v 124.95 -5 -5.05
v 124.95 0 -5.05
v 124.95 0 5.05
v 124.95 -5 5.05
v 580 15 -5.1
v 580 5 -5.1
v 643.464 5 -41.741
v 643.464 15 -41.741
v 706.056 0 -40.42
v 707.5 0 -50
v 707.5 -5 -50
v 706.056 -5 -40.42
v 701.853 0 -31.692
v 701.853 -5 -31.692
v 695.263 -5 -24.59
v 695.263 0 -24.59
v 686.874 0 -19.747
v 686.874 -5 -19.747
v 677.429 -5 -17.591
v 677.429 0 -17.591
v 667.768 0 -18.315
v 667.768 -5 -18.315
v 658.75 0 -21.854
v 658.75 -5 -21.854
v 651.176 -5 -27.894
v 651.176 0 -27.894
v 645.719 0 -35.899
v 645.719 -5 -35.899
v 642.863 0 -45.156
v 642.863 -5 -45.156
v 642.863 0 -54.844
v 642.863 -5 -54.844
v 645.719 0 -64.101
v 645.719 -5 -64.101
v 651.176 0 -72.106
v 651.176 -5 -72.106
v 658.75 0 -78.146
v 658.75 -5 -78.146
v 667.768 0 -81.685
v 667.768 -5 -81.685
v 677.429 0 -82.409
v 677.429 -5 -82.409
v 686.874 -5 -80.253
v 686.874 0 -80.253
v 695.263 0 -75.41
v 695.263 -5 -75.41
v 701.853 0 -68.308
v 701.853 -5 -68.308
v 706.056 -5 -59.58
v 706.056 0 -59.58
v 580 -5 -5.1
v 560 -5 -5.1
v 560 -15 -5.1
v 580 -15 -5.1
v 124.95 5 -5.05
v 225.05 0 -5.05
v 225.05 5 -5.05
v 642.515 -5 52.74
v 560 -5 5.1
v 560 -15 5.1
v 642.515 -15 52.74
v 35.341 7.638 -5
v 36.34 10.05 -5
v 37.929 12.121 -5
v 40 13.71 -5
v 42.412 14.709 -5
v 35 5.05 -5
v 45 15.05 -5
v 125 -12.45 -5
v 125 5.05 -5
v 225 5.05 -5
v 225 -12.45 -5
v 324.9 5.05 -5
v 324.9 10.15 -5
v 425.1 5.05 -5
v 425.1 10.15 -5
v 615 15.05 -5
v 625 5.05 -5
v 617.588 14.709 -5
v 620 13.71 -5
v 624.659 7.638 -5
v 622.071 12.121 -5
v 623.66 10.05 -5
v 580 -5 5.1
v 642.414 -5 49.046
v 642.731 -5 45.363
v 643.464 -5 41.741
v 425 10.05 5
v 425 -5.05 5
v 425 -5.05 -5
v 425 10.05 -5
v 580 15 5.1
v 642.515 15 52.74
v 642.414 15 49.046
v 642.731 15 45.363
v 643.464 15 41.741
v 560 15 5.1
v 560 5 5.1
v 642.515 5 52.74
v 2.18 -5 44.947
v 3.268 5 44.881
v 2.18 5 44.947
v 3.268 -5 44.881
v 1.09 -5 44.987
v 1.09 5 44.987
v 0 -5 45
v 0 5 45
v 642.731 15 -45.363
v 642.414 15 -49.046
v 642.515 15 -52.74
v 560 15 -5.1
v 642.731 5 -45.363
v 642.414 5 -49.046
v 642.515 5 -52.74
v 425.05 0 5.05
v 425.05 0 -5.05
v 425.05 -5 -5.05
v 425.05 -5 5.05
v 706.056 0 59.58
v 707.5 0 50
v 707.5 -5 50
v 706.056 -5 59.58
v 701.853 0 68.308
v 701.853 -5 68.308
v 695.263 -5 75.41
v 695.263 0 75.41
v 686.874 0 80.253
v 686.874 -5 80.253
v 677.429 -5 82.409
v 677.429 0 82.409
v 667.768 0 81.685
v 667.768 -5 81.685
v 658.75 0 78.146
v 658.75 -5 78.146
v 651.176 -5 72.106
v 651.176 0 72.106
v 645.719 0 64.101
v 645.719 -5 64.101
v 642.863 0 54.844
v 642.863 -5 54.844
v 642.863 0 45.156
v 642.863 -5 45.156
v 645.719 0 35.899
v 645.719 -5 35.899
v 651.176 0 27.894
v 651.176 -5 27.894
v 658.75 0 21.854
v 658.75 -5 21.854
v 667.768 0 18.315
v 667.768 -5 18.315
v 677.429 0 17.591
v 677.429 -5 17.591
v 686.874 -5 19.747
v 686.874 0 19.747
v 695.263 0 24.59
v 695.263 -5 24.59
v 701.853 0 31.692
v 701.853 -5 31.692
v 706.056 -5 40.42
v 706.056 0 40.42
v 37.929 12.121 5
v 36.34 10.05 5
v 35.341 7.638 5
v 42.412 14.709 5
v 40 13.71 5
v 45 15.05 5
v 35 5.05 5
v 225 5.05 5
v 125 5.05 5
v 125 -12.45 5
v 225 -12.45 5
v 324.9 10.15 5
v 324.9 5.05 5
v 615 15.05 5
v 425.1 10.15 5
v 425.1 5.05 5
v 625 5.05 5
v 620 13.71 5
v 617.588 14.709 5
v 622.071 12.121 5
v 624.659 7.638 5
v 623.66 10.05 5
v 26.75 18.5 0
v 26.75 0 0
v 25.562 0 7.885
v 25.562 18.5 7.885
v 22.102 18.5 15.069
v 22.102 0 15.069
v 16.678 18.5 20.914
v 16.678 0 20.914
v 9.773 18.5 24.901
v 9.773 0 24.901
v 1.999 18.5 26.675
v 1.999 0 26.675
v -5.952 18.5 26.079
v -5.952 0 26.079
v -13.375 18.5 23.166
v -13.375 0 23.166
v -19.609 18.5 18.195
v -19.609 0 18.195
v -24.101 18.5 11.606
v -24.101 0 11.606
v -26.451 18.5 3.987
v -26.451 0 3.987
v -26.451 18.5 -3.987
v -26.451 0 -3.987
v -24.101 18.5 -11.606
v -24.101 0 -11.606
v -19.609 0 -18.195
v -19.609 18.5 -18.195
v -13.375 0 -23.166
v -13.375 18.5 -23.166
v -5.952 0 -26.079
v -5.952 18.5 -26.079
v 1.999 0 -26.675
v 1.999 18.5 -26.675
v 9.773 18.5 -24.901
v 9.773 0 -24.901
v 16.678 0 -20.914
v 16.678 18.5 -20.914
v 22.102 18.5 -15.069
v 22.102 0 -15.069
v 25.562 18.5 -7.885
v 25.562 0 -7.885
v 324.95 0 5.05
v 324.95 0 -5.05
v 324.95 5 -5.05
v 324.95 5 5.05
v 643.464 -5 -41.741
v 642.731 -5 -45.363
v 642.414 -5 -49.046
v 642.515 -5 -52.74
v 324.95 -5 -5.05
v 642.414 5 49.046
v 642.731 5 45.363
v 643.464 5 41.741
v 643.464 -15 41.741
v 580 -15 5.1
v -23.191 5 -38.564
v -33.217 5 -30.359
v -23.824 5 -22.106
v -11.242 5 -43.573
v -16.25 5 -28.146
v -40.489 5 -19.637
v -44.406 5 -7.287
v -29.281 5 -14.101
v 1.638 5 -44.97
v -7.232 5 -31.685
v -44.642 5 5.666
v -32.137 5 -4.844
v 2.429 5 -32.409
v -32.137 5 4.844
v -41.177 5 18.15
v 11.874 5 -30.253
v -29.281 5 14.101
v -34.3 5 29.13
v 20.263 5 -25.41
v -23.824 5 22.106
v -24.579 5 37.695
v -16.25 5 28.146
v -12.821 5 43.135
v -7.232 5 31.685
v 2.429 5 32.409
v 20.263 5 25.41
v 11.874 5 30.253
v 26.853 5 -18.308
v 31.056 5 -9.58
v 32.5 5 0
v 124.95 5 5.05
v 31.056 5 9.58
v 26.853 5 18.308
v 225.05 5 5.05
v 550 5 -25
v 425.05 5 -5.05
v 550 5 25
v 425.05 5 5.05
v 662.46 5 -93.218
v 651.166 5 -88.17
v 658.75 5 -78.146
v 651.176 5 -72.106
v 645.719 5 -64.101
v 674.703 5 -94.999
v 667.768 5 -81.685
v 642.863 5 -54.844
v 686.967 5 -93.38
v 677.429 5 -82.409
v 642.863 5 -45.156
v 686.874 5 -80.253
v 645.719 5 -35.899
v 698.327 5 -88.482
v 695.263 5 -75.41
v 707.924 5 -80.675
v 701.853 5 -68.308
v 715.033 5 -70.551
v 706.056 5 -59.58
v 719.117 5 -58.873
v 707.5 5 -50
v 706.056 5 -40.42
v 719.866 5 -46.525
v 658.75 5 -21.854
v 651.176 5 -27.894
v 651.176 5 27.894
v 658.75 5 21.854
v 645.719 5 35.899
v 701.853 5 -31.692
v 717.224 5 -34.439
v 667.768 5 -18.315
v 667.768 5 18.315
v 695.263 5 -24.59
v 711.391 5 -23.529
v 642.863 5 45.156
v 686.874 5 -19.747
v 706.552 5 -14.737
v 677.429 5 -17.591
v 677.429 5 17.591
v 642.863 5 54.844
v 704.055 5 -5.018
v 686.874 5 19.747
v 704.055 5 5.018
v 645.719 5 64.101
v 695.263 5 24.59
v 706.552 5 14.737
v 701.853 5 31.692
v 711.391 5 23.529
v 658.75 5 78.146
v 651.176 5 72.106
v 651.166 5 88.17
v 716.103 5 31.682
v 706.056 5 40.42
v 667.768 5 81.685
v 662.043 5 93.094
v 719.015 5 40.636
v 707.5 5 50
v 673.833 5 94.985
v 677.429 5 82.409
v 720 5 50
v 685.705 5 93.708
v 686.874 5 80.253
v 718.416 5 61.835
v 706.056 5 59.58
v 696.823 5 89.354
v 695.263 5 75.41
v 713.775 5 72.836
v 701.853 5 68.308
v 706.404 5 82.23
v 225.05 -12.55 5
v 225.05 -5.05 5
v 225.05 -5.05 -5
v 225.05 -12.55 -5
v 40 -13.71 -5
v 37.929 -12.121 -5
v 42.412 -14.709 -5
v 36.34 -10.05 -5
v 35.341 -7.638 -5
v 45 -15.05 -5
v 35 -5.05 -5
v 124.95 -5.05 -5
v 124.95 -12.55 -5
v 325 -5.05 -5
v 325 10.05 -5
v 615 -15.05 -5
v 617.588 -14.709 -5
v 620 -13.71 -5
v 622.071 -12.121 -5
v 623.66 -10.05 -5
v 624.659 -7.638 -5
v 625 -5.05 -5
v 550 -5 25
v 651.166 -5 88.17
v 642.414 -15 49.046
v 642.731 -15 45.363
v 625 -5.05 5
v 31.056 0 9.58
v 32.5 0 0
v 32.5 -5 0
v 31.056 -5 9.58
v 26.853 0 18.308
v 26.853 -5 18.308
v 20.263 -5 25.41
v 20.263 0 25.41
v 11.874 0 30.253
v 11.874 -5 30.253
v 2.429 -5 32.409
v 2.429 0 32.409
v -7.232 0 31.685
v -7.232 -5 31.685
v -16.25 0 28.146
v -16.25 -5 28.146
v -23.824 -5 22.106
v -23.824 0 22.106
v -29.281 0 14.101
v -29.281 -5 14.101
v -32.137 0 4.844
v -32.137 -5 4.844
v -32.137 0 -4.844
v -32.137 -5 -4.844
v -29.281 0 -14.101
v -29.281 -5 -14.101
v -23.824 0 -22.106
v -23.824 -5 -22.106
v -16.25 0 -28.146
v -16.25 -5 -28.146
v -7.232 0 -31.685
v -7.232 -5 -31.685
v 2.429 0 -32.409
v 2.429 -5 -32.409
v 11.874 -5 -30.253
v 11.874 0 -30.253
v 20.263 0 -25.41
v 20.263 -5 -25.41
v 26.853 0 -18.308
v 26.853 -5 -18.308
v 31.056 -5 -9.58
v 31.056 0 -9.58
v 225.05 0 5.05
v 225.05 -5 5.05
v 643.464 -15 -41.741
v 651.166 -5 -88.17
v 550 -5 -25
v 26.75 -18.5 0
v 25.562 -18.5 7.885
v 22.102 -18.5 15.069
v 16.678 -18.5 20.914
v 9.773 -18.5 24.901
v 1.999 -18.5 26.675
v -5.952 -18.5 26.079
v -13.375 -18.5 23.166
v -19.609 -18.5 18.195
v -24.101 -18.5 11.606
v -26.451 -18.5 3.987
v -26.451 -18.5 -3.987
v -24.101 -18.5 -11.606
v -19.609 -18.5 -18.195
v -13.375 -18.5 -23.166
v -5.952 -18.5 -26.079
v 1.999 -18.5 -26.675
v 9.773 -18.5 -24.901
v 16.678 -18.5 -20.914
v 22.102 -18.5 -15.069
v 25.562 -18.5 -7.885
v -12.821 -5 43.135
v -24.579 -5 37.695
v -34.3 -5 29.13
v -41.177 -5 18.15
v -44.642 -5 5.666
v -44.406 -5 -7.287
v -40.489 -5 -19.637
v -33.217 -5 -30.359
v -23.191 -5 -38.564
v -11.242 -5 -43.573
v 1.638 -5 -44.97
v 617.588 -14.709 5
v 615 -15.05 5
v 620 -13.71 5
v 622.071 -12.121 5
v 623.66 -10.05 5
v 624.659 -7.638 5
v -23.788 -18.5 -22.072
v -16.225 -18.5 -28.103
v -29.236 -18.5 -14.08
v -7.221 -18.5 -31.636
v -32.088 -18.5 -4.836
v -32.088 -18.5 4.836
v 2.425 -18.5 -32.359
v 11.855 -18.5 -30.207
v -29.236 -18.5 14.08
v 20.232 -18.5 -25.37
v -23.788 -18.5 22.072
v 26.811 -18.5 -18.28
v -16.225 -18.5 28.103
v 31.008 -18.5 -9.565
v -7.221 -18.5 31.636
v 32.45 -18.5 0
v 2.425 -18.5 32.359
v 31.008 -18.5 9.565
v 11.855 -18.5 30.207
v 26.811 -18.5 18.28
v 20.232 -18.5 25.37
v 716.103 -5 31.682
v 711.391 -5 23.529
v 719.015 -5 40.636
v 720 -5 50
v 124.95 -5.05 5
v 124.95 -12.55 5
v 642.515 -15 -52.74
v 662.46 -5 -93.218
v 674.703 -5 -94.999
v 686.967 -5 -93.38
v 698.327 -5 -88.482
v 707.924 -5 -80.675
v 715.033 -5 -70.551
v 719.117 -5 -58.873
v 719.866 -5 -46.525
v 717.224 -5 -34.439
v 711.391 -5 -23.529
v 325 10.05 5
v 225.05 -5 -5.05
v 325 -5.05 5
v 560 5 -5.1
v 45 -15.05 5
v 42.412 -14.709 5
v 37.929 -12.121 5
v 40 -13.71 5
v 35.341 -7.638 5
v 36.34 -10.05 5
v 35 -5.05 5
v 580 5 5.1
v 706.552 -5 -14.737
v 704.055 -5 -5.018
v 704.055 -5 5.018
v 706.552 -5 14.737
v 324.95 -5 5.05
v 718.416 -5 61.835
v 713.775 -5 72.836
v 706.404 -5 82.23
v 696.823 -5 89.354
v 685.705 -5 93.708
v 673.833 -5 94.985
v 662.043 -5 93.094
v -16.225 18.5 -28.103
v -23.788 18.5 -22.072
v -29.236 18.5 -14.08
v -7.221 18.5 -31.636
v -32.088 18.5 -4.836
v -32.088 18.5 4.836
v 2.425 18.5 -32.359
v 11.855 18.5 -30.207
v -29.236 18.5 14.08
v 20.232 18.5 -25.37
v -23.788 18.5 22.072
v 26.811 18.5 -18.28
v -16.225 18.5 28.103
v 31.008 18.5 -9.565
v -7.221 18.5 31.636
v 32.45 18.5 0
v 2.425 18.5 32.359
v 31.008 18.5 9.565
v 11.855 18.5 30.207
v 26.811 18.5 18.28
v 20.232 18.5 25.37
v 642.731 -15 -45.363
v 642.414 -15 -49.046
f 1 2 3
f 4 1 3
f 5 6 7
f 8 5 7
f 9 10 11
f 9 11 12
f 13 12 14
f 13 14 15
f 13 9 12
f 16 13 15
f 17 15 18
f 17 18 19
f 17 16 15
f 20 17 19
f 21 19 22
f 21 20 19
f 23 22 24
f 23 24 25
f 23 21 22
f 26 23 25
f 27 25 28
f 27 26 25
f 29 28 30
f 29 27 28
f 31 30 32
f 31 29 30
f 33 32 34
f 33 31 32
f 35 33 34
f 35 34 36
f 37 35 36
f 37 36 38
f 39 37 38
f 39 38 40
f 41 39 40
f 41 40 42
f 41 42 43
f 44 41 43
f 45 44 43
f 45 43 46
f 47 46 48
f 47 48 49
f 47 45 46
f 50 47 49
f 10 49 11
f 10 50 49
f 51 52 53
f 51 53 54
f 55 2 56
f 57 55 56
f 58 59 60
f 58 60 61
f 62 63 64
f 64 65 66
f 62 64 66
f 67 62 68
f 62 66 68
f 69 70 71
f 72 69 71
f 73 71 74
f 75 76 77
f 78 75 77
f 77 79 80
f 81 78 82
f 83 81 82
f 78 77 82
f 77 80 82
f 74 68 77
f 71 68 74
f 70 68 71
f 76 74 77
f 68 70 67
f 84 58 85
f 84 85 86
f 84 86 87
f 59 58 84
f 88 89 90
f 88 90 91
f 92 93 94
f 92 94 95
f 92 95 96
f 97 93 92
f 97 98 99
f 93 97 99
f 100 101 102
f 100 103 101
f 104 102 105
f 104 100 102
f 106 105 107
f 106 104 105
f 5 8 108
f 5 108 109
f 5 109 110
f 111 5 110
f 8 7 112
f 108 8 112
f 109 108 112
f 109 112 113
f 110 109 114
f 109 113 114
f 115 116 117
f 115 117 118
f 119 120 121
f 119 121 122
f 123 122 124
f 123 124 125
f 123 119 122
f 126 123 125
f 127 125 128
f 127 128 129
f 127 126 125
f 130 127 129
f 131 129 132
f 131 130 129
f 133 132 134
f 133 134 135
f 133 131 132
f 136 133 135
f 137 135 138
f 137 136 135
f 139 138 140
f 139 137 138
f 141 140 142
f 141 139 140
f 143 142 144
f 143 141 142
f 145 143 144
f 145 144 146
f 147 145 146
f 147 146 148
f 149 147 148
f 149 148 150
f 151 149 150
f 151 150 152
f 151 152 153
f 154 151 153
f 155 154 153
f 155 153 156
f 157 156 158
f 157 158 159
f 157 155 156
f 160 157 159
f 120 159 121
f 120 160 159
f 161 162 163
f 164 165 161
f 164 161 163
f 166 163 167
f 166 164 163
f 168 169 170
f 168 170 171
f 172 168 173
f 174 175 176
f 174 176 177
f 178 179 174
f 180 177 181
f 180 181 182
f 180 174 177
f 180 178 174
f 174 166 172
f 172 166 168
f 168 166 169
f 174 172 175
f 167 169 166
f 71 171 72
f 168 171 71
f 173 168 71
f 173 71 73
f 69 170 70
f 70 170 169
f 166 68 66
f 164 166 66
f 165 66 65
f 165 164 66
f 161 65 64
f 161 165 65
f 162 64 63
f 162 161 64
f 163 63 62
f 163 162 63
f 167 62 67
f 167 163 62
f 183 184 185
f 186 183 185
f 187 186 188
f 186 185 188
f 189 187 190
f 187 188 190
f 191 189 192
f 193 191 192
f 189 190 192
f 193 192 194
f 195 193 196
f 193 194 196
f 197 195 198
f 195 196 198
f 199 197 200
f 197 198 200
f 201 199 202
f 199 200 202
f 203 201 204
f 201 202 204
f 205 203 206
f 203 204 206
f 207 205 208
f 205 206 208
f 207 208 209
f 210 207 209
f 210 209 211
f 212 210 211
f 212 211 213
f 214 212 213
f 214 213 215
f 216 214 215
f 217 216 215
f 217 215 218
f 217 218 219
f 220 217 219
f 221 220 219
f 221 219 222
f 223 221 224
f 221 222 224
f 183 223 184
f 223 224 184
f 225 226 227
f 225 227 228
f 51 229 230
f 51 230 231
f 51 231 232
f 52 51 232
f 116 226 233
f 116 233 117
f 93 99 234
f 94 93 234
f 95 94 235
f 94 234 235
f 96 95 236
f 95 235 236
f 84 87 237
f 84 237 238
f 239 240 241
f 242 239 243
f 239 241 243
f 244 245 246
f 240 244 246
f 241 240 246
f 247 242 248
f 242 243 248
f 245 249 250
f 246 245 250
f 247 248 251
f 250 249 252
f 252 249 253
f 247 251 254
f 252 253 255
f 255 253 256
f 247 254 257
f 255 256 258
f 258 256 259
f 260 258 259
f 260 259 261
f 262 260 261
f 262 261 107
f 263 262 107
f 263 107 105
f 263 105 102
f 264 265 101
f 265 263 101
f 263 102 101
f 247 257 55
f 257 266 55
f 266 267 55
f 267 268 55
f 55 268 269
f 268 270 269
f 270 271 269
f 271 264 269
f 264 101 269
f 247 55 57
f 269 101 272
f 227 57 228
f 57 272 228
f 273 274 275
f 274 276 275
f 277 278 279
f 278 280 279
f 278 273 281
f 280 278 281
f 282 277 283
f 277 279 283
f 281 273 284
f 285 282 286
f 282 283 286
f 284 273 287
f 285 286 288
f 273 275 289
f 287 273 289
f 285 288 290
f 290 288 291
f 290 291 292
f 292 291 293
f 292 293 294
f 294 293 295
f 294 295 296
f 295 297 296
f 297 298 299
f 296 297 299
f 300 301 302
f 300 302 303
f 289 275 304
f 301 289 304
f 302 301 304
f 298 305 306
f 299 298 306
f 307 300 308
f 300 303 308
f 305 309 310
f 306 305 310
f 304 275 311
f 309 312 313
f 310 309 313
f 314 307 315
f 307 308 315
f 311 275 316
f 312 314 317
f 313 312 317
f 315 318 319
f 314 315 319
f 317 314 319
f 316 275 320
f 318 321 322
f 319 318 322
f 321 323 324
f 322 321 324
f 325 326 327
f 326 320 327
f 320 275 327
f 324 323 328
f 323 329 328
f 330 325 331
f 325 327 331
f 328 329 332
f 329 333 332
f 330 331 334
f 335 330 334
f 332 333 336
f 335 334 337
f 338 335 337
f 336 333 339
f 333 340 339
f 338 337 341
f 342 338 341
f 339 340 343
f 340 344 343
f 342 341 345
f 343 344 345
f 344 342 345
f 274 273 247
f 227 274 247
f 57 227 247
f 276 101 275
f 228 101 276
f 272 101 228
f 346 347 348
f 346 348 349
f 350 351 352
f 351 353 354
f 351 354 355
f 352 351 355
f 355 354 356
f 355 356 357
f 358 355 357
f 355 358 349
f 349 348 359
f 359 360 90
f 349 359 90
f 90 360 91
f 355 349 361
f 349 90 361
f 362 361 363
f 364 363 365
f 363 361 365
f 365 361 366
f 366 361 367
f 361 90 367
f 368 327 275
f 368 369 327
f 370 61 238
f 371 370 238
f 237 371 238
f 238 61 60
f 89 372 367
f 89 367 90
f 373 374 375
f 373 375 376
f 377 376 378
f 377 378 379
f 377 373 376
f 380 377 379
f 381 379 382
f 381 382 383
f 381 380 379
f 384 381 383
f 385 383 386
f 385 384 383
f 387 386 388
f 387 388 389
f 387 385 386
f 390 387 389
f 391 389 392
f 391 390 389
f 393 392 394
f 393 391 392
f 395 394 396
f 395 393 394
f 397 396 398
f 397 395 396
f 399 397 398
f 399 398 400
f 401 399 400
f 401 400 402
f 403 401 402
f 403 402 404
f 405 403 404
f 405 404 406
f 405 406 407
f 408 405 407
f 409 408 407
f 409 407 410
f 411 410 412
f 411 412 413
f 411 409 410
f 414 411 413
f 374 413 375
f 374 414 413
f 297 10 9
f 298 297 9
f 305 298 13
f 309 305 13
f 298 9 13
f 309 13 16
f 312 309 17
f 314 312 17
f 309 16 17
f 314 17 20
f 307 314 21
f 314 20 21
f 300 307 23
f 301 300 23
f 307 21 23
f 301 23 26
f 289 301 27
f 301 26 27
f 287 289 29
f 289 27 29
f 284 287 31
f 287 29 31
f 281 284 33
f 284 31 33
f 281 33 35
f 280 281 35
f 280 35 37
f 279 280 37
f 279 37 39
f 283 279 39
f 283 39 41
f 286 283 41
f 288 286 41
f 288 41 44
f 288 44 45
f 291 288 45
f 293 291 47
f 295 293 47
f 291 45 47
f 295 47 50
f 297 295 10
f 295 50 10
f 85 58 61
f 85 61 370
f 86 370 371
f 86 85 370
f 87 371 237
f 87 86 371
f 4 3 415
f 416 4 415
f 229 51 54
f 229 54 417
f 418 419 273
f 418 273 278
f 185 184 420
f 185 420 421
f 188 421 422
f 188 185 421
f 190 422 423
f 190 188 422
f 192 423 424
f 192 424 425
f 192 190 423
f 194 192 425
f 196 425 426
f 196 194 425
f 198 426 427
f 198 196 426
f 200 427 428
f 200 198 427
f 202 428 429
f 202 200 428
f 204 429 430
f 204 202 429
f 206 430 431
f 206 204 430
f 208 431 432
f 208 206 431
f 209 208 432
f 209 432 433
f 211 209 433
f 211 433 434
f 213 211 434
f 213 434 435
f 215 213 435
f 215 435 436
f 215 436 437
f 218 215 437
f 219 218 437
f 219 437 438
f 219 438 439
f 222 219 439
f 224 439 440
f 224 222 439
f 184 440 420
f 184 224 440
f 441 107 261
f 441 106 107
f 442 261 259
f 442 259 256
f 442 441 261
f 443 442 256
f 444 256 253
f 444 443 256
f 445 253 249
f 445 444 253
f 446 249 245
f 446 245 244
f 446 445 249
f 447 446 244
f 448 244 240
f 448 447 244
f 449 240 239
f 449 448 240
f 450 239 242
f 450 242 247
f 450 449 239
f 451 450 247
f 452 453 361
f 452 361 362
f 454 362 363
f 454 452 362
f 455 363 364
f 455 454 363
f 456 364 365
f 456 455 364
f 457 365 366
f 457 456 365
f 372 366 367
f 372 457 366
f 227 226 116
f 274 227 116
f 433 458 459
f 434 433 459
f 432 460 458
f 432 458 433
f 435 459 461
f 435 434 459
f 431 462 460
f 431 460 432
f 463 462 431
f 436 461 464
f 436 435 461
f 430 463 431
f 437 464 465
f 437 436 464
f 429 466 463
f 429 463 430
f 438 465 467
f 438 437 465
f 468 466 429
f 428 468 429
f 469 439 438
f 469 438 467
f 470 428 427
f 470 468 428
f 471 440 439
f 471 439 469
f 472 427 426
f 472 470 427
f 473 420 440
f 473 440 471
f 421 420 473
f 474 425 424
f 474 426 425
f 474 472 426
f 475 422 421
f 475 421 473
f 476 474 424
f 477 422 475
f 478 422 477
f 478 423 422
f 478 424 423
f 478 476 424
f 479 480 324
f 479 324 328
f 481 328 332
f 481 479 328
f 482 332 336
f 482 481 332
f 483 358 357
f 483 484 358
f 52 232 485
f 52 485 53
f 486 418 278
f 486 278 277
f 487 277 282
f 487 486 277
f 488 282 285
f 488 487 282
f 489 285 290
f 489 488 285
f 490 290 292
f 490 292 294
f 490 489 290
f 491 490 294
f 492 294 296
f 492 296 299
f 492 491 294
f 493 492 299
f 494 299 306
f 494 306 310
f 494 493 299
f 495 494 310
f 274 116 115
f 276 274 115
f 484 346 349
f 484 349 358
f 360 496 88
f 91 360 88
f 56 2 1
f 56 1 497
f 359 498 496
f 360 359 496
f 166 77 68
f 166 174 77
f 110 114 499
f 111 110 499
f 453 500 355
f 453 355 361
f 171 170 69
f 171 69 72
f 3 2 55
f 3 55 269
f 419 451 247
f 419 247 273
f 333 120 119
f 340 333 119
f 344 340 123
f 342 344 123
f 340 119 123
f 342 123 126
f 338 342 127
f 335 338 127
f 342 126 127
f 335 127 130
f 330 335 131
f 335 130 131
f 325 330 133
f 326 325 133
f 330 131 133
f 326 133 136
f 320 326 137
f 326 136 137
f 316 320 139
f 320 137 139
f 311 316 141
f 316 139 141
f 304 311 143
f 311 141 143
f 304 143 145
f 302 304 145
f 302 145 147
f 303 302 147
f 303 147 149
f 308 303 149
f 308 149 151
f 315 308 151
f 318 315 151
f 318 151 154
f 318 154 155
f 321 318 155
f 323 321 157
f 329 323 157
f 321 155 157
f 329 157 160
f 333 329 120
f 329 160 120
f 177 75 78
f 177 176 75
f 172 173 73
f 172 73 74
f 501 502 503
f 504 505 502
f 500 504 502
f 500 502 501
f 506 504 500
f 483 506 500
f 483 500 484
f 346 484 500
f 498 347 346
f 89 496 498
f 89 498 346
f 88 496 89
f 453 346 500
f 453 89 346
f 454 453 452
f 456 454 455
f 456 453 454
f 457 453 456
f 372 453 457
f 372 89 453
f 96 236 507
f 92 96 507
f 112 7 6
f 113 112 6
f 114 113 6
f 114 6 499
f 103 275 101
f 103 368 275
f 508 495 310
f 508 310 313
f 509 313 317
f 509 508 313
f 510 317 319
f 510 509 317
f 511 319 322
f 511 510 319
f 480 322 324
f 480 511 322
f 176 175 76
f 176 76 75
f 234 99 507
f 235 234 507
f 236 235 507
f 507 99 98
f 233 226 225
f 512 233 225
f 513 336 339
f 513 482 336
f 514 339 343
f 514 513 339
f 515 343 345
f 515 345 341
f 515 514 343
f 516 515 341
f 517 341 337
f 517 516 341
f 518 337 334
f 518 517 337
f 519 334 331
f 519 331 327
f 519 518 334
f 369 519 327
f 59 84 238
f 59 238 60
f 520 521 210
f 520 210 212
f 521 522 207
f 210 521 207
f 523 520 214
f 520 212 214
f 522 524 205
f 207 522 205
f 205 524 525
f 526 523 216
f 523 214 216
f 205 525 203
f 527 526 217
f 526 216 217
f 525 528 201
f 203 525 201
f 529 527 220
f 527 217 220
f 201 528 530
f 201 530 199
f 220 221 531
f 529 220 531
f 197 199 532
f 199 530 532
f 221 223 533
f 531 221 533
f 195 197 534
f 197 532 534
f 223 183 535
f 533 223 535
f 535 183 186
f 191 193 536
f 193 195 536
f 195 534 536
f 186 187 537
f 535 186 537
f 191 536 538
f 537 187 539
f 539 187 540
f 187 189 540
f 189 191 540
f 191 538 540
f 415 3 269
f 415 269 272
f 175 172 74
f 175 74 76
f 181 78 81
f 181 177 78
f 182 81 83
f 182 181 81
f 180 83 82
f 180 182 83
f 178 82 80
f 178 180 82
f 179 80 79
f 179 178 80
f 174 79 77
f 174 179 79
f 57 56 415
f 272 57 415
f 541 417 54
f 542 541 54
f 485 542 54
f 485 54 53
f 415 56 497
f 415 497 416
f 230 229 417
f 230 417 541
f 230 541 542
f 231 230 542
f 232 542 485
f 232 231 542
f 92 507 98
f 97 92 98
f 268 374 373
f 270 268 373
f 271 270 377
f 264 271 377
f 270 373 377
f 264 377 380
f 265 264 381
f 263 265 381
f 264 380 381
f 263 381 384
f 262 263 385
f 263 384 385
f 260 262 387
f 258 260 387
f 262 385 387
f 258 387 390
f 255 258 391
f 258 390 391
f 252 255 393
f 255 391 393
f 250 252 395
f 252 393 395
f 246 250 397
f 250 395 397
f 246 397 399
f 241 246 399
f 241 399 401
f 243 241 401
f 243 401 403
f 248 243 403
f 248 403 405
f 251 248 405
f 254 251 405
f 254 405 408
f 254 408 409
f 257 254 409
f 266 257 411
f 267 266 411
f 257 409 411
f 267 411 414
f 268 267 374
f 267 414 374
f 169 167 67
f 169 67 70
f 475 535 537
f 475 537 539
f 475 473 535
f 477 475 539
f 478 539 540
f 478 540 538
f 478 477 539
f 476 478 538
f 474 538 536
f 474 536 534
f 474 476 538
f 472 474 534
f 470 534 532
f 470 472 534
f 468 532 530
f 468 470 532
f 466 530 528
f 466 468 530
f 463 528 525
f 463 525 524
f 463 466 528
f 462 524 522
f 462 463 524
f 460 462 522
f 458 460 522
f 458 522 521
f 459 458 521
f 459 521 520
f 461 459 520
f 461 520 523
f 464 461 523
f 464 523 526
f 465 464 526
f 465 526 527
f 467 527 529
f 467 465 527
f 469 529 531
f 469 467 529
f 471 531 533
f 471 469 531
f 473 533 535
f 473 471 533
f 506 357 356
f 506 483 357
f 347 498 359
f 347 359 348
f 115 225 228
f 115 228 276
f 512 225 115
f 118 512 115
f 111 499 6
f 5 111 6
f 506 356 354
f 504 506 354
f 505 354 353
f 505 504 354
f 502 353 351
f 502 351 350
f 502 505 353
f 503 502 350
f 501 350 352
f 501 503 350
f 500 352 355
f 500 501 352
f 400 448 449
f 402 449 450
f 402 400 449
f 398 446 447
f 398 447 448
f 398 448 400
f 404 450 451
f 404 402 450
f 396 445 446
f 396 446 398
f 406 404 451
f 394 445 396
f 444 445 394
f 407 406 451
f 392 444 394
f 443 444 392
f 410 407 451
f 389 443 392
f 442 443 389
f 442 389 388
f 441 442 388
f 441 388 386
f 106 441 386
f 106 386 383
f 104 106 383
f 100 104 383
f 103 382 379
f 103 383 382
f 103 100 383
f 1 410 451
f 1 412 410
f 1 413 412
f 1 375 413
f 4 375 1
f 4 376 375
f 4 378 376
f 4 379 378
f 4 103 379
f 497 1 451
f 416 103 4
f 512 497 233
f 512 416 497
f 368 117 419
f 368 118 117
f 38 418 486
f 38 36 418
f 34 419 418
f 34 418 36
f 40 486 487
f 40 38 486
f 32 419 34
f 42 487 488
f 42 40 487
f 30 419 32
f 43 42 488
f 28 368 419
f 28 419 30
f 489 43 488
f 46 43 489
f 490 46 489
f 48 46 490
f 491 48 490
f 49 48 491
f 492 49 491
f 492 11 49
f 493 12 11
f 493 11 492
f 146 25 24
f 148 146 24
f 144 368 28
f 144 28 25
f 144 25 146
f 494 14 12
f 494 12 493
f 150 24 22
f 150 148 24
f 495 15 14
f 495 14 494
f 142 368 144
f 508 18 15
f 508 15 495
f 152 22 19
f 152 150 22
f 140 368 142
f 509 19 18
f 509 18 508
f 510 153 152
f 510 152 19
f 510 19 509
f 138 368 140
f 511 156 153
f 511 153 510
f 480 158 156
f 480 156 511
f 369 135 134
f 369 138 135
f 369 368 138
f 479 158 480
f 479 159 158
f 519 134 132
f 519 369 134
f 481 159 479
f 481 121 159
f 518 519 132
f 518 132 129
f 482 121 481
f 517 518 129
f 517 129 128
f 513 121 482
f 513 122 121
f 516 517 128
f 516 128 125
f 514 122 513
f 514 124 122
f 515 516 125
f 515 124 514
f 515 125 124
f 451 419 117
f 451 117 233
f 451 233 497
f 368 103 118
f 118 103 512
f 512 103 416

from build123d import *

# Parameters (mm, degrees)
F0_R          = 32.5
F0_W          = 100.1
F0_H          = 10.1
F1_DEPTH      = 5
F1_DEPTH_BACK = 5
F2_W          = 100
F2_H          = 17.5
F2_H_2        = 15.1
F3_DEPTH      = 5
F3_DEPTH_BACK = 5
F5_DEPTH      = 10
F7_R          = 32.45
F7_R_2        = 26.75
F8_DEPTH      = 18.5
F8_DEPTH_BACK = 18.5


with BuildPart() as f1:
    # F0 (on Front) → F1 (new body, two sides)
    with BuildSketch(Plane.XZ) as f1_sk:
        with BuildLine():
            ThreePointArc((1.637721, -44.970189), (32.393652, -31.235417), (45, 0))
            ThreePointArc((45, 0), (32.955108, 30.642469), (3.268405, 44.881149))
            Line((3.268405, 44.881149), (0, 45))
            ThreePointArc((0, 45), (-44.992547, -0.818996), (1.637721, -44.970189))
        make_face()
        Circle(F0_R, mode=Mode.SUBTRACT)
        with BuildLine():
            ThreePointArc((3.268405, 44.881149), (32.955108, 30.642469), (45, 0))
            ThreePointArc((45, 0), (32.393652, -31.235417), (1.637721, -44.970189))
            Line((1.637721, -44.970189), (550, -25))
            Line((550, -25), (651.16602, -88.169902))
            ThreePointArc((651.16602, -88.169902), (707.924431, -80.675427), (711.391042, -23.529412))
            ThreePointArc((711.391042, -23.529412), (703.738635, 0), (711.391042, 23.529412))
            ThreePointArc((711.391042, 23.529412), (642.075569, 19.324573), (651.16602, 88.169902))
            Line((651.16602, 88.169902), (550, 25))
            Line((550, 25), (3.268405, 44.881149))
        make_face()
        with Locations((175, 0)):
            Rectangle(F0_W, F0_H, mode=Mode.SUBTRACT)
        with Locations((675, -50)):
            Circle(F0_R, mode=Mode.SUBTRACT)
        with Locations((375, 0)):
            Rectangle(F0_W, F0_H, mode=Mode.SUBTRACT)
        with BuildLine():
            Line((0, 45), (3.268405, 44.881149))
            ThreePointArc((3.268405, 44.881149), (1.635283, 44.970277), (0, 45))
        make_face()
        with BuildLine():
            ThreePointArc((720, 50), (696.822819, 89.354346), (651.16602, 88.169902))
            ThreePointArc((651.16602, 88.169902), (642.075569, 19.324573), (711.391042, 23.529412))
            ThreePointArc((711.391042, 23.529412), (717.793673, 36.08233), (720, 50))
        make_face()
        with Locations((675, 50)):
            Circle(F0_R, mode=Mode.SUBTRACT)
    extrude(amount=F1_DEPTH)
    extrude(f1_sk.sketch, amount=-F1_DEPTH_BACK)


with BuildPart() as f3:
    # F2 (on Top) → F3 (new body, two sides)
    with BuildSketch(Plane.XY) as f3_sk:
        with BuildLine():
            Line((615, 15.05), (45, 15.05))
            ThreePointArc((45, 15.05), (37.928932, 12.121068), (35, 5.05))
            Line((35, 5.05), (125, 5.05))
            Line((125, 5.05), (225, 5.05))
            Line((225, 5.05), (324.9, 5.05))
            Line((324.9, 5.05), (324.9, 10.15))
            Line((324.9, 10.15), (425.1, 10.15))
            Line((425.1, 10.15), (425.1, 5.05))
            Line((425.1, 5.05), (625, 5.05))
            ThreePointArc((625, 5.05), (622.071068, 12.121068), (615, 15.05))
        make_face()
        with Locations((175, -3.7)):
            Rectangle(F2_W, F2_H)
        with BuildLine():
            ThreePointArc((35, -5.05), (37.928932, -12.121068), (45, -15.05))
            Line((45, -15.05), (615, -15.05))
            ThreePointArc((615, -15.05), (622.071068, -12.121068), (625, -5.05))
            Line((625, -5.05), (425, -5.05))
            Line((425, -5.05), (325, -5.05))
            Line((325, -5.05), (225.05, -5.05))
            Line((225.05, -5.05), (225.05, -12.55))
            Line((225.05, -12.55), (124.95, -12.55))
            Line((124.95, -12.55), (124.95, -5.05))
            Line((124.95, -5.05), (35, -5.05))
        make_face()
        with Locations((375, 2.5)):
            Rectangle(F2_W, F2_H_2)
    extrude(amount=F3_DEPTH)
    extrude(f3_sk.sketch, amount=-F3_DEPTH_BACK)


with BuildPart() as f5:
    # F4 (on face) → F5 (new body)
    with BuildSketch(Plane(origin=(0, 5, 0), x_dir=(-1, 0, 0), z_dir=(0, 1, 0))):
        with BuildLine():
            Line((-580, -5.1), (-643.463602, -41.740728))
            ThreePointArc((-643.463602, -41.740728), (-642.520462, -47.200068), (-642.515374, -52.740274))
            Line((-642.515374, -52.740274), (-560, -5.1))
            Line((-560, -5.1), (-580, -5.1))
        make_face()
        with BuildLine():
            Line((-643.463602, 41.740728), (-580, 5.1))
            Line((-580, 5.1), (-560, 5.1))
            Line((-560, 5.1), (-642.515374, 52.740274))
            ThreePointArc((-642.515374, 52.740274), (-642.520462, 47.200068), (-643.463602, 41.740728))
        make_face()
    extrude(amount=F5_DEPTH)


with BuildPart() as f6_1:
    # F6: instance of F5
    add(f5.part.mirror(Plane.XZ))


with BuildPart() as f8:
    # F7 (on Front) → F8 (new body, two sides)
    with BuildSketch(Plane.XZ) as f8_sk:
        Circle(F7_R)
        Circle(F7_R_2, mode=Mode.SUBTRACT)
    extrude(amount=F8_DEPTH)
    extrude(f8_sk.sketch, amount=-F8_DEPTH_BACK)


solid = Compound([f1.part, f3.part, f5.part, f6_1.part, f8.part])
